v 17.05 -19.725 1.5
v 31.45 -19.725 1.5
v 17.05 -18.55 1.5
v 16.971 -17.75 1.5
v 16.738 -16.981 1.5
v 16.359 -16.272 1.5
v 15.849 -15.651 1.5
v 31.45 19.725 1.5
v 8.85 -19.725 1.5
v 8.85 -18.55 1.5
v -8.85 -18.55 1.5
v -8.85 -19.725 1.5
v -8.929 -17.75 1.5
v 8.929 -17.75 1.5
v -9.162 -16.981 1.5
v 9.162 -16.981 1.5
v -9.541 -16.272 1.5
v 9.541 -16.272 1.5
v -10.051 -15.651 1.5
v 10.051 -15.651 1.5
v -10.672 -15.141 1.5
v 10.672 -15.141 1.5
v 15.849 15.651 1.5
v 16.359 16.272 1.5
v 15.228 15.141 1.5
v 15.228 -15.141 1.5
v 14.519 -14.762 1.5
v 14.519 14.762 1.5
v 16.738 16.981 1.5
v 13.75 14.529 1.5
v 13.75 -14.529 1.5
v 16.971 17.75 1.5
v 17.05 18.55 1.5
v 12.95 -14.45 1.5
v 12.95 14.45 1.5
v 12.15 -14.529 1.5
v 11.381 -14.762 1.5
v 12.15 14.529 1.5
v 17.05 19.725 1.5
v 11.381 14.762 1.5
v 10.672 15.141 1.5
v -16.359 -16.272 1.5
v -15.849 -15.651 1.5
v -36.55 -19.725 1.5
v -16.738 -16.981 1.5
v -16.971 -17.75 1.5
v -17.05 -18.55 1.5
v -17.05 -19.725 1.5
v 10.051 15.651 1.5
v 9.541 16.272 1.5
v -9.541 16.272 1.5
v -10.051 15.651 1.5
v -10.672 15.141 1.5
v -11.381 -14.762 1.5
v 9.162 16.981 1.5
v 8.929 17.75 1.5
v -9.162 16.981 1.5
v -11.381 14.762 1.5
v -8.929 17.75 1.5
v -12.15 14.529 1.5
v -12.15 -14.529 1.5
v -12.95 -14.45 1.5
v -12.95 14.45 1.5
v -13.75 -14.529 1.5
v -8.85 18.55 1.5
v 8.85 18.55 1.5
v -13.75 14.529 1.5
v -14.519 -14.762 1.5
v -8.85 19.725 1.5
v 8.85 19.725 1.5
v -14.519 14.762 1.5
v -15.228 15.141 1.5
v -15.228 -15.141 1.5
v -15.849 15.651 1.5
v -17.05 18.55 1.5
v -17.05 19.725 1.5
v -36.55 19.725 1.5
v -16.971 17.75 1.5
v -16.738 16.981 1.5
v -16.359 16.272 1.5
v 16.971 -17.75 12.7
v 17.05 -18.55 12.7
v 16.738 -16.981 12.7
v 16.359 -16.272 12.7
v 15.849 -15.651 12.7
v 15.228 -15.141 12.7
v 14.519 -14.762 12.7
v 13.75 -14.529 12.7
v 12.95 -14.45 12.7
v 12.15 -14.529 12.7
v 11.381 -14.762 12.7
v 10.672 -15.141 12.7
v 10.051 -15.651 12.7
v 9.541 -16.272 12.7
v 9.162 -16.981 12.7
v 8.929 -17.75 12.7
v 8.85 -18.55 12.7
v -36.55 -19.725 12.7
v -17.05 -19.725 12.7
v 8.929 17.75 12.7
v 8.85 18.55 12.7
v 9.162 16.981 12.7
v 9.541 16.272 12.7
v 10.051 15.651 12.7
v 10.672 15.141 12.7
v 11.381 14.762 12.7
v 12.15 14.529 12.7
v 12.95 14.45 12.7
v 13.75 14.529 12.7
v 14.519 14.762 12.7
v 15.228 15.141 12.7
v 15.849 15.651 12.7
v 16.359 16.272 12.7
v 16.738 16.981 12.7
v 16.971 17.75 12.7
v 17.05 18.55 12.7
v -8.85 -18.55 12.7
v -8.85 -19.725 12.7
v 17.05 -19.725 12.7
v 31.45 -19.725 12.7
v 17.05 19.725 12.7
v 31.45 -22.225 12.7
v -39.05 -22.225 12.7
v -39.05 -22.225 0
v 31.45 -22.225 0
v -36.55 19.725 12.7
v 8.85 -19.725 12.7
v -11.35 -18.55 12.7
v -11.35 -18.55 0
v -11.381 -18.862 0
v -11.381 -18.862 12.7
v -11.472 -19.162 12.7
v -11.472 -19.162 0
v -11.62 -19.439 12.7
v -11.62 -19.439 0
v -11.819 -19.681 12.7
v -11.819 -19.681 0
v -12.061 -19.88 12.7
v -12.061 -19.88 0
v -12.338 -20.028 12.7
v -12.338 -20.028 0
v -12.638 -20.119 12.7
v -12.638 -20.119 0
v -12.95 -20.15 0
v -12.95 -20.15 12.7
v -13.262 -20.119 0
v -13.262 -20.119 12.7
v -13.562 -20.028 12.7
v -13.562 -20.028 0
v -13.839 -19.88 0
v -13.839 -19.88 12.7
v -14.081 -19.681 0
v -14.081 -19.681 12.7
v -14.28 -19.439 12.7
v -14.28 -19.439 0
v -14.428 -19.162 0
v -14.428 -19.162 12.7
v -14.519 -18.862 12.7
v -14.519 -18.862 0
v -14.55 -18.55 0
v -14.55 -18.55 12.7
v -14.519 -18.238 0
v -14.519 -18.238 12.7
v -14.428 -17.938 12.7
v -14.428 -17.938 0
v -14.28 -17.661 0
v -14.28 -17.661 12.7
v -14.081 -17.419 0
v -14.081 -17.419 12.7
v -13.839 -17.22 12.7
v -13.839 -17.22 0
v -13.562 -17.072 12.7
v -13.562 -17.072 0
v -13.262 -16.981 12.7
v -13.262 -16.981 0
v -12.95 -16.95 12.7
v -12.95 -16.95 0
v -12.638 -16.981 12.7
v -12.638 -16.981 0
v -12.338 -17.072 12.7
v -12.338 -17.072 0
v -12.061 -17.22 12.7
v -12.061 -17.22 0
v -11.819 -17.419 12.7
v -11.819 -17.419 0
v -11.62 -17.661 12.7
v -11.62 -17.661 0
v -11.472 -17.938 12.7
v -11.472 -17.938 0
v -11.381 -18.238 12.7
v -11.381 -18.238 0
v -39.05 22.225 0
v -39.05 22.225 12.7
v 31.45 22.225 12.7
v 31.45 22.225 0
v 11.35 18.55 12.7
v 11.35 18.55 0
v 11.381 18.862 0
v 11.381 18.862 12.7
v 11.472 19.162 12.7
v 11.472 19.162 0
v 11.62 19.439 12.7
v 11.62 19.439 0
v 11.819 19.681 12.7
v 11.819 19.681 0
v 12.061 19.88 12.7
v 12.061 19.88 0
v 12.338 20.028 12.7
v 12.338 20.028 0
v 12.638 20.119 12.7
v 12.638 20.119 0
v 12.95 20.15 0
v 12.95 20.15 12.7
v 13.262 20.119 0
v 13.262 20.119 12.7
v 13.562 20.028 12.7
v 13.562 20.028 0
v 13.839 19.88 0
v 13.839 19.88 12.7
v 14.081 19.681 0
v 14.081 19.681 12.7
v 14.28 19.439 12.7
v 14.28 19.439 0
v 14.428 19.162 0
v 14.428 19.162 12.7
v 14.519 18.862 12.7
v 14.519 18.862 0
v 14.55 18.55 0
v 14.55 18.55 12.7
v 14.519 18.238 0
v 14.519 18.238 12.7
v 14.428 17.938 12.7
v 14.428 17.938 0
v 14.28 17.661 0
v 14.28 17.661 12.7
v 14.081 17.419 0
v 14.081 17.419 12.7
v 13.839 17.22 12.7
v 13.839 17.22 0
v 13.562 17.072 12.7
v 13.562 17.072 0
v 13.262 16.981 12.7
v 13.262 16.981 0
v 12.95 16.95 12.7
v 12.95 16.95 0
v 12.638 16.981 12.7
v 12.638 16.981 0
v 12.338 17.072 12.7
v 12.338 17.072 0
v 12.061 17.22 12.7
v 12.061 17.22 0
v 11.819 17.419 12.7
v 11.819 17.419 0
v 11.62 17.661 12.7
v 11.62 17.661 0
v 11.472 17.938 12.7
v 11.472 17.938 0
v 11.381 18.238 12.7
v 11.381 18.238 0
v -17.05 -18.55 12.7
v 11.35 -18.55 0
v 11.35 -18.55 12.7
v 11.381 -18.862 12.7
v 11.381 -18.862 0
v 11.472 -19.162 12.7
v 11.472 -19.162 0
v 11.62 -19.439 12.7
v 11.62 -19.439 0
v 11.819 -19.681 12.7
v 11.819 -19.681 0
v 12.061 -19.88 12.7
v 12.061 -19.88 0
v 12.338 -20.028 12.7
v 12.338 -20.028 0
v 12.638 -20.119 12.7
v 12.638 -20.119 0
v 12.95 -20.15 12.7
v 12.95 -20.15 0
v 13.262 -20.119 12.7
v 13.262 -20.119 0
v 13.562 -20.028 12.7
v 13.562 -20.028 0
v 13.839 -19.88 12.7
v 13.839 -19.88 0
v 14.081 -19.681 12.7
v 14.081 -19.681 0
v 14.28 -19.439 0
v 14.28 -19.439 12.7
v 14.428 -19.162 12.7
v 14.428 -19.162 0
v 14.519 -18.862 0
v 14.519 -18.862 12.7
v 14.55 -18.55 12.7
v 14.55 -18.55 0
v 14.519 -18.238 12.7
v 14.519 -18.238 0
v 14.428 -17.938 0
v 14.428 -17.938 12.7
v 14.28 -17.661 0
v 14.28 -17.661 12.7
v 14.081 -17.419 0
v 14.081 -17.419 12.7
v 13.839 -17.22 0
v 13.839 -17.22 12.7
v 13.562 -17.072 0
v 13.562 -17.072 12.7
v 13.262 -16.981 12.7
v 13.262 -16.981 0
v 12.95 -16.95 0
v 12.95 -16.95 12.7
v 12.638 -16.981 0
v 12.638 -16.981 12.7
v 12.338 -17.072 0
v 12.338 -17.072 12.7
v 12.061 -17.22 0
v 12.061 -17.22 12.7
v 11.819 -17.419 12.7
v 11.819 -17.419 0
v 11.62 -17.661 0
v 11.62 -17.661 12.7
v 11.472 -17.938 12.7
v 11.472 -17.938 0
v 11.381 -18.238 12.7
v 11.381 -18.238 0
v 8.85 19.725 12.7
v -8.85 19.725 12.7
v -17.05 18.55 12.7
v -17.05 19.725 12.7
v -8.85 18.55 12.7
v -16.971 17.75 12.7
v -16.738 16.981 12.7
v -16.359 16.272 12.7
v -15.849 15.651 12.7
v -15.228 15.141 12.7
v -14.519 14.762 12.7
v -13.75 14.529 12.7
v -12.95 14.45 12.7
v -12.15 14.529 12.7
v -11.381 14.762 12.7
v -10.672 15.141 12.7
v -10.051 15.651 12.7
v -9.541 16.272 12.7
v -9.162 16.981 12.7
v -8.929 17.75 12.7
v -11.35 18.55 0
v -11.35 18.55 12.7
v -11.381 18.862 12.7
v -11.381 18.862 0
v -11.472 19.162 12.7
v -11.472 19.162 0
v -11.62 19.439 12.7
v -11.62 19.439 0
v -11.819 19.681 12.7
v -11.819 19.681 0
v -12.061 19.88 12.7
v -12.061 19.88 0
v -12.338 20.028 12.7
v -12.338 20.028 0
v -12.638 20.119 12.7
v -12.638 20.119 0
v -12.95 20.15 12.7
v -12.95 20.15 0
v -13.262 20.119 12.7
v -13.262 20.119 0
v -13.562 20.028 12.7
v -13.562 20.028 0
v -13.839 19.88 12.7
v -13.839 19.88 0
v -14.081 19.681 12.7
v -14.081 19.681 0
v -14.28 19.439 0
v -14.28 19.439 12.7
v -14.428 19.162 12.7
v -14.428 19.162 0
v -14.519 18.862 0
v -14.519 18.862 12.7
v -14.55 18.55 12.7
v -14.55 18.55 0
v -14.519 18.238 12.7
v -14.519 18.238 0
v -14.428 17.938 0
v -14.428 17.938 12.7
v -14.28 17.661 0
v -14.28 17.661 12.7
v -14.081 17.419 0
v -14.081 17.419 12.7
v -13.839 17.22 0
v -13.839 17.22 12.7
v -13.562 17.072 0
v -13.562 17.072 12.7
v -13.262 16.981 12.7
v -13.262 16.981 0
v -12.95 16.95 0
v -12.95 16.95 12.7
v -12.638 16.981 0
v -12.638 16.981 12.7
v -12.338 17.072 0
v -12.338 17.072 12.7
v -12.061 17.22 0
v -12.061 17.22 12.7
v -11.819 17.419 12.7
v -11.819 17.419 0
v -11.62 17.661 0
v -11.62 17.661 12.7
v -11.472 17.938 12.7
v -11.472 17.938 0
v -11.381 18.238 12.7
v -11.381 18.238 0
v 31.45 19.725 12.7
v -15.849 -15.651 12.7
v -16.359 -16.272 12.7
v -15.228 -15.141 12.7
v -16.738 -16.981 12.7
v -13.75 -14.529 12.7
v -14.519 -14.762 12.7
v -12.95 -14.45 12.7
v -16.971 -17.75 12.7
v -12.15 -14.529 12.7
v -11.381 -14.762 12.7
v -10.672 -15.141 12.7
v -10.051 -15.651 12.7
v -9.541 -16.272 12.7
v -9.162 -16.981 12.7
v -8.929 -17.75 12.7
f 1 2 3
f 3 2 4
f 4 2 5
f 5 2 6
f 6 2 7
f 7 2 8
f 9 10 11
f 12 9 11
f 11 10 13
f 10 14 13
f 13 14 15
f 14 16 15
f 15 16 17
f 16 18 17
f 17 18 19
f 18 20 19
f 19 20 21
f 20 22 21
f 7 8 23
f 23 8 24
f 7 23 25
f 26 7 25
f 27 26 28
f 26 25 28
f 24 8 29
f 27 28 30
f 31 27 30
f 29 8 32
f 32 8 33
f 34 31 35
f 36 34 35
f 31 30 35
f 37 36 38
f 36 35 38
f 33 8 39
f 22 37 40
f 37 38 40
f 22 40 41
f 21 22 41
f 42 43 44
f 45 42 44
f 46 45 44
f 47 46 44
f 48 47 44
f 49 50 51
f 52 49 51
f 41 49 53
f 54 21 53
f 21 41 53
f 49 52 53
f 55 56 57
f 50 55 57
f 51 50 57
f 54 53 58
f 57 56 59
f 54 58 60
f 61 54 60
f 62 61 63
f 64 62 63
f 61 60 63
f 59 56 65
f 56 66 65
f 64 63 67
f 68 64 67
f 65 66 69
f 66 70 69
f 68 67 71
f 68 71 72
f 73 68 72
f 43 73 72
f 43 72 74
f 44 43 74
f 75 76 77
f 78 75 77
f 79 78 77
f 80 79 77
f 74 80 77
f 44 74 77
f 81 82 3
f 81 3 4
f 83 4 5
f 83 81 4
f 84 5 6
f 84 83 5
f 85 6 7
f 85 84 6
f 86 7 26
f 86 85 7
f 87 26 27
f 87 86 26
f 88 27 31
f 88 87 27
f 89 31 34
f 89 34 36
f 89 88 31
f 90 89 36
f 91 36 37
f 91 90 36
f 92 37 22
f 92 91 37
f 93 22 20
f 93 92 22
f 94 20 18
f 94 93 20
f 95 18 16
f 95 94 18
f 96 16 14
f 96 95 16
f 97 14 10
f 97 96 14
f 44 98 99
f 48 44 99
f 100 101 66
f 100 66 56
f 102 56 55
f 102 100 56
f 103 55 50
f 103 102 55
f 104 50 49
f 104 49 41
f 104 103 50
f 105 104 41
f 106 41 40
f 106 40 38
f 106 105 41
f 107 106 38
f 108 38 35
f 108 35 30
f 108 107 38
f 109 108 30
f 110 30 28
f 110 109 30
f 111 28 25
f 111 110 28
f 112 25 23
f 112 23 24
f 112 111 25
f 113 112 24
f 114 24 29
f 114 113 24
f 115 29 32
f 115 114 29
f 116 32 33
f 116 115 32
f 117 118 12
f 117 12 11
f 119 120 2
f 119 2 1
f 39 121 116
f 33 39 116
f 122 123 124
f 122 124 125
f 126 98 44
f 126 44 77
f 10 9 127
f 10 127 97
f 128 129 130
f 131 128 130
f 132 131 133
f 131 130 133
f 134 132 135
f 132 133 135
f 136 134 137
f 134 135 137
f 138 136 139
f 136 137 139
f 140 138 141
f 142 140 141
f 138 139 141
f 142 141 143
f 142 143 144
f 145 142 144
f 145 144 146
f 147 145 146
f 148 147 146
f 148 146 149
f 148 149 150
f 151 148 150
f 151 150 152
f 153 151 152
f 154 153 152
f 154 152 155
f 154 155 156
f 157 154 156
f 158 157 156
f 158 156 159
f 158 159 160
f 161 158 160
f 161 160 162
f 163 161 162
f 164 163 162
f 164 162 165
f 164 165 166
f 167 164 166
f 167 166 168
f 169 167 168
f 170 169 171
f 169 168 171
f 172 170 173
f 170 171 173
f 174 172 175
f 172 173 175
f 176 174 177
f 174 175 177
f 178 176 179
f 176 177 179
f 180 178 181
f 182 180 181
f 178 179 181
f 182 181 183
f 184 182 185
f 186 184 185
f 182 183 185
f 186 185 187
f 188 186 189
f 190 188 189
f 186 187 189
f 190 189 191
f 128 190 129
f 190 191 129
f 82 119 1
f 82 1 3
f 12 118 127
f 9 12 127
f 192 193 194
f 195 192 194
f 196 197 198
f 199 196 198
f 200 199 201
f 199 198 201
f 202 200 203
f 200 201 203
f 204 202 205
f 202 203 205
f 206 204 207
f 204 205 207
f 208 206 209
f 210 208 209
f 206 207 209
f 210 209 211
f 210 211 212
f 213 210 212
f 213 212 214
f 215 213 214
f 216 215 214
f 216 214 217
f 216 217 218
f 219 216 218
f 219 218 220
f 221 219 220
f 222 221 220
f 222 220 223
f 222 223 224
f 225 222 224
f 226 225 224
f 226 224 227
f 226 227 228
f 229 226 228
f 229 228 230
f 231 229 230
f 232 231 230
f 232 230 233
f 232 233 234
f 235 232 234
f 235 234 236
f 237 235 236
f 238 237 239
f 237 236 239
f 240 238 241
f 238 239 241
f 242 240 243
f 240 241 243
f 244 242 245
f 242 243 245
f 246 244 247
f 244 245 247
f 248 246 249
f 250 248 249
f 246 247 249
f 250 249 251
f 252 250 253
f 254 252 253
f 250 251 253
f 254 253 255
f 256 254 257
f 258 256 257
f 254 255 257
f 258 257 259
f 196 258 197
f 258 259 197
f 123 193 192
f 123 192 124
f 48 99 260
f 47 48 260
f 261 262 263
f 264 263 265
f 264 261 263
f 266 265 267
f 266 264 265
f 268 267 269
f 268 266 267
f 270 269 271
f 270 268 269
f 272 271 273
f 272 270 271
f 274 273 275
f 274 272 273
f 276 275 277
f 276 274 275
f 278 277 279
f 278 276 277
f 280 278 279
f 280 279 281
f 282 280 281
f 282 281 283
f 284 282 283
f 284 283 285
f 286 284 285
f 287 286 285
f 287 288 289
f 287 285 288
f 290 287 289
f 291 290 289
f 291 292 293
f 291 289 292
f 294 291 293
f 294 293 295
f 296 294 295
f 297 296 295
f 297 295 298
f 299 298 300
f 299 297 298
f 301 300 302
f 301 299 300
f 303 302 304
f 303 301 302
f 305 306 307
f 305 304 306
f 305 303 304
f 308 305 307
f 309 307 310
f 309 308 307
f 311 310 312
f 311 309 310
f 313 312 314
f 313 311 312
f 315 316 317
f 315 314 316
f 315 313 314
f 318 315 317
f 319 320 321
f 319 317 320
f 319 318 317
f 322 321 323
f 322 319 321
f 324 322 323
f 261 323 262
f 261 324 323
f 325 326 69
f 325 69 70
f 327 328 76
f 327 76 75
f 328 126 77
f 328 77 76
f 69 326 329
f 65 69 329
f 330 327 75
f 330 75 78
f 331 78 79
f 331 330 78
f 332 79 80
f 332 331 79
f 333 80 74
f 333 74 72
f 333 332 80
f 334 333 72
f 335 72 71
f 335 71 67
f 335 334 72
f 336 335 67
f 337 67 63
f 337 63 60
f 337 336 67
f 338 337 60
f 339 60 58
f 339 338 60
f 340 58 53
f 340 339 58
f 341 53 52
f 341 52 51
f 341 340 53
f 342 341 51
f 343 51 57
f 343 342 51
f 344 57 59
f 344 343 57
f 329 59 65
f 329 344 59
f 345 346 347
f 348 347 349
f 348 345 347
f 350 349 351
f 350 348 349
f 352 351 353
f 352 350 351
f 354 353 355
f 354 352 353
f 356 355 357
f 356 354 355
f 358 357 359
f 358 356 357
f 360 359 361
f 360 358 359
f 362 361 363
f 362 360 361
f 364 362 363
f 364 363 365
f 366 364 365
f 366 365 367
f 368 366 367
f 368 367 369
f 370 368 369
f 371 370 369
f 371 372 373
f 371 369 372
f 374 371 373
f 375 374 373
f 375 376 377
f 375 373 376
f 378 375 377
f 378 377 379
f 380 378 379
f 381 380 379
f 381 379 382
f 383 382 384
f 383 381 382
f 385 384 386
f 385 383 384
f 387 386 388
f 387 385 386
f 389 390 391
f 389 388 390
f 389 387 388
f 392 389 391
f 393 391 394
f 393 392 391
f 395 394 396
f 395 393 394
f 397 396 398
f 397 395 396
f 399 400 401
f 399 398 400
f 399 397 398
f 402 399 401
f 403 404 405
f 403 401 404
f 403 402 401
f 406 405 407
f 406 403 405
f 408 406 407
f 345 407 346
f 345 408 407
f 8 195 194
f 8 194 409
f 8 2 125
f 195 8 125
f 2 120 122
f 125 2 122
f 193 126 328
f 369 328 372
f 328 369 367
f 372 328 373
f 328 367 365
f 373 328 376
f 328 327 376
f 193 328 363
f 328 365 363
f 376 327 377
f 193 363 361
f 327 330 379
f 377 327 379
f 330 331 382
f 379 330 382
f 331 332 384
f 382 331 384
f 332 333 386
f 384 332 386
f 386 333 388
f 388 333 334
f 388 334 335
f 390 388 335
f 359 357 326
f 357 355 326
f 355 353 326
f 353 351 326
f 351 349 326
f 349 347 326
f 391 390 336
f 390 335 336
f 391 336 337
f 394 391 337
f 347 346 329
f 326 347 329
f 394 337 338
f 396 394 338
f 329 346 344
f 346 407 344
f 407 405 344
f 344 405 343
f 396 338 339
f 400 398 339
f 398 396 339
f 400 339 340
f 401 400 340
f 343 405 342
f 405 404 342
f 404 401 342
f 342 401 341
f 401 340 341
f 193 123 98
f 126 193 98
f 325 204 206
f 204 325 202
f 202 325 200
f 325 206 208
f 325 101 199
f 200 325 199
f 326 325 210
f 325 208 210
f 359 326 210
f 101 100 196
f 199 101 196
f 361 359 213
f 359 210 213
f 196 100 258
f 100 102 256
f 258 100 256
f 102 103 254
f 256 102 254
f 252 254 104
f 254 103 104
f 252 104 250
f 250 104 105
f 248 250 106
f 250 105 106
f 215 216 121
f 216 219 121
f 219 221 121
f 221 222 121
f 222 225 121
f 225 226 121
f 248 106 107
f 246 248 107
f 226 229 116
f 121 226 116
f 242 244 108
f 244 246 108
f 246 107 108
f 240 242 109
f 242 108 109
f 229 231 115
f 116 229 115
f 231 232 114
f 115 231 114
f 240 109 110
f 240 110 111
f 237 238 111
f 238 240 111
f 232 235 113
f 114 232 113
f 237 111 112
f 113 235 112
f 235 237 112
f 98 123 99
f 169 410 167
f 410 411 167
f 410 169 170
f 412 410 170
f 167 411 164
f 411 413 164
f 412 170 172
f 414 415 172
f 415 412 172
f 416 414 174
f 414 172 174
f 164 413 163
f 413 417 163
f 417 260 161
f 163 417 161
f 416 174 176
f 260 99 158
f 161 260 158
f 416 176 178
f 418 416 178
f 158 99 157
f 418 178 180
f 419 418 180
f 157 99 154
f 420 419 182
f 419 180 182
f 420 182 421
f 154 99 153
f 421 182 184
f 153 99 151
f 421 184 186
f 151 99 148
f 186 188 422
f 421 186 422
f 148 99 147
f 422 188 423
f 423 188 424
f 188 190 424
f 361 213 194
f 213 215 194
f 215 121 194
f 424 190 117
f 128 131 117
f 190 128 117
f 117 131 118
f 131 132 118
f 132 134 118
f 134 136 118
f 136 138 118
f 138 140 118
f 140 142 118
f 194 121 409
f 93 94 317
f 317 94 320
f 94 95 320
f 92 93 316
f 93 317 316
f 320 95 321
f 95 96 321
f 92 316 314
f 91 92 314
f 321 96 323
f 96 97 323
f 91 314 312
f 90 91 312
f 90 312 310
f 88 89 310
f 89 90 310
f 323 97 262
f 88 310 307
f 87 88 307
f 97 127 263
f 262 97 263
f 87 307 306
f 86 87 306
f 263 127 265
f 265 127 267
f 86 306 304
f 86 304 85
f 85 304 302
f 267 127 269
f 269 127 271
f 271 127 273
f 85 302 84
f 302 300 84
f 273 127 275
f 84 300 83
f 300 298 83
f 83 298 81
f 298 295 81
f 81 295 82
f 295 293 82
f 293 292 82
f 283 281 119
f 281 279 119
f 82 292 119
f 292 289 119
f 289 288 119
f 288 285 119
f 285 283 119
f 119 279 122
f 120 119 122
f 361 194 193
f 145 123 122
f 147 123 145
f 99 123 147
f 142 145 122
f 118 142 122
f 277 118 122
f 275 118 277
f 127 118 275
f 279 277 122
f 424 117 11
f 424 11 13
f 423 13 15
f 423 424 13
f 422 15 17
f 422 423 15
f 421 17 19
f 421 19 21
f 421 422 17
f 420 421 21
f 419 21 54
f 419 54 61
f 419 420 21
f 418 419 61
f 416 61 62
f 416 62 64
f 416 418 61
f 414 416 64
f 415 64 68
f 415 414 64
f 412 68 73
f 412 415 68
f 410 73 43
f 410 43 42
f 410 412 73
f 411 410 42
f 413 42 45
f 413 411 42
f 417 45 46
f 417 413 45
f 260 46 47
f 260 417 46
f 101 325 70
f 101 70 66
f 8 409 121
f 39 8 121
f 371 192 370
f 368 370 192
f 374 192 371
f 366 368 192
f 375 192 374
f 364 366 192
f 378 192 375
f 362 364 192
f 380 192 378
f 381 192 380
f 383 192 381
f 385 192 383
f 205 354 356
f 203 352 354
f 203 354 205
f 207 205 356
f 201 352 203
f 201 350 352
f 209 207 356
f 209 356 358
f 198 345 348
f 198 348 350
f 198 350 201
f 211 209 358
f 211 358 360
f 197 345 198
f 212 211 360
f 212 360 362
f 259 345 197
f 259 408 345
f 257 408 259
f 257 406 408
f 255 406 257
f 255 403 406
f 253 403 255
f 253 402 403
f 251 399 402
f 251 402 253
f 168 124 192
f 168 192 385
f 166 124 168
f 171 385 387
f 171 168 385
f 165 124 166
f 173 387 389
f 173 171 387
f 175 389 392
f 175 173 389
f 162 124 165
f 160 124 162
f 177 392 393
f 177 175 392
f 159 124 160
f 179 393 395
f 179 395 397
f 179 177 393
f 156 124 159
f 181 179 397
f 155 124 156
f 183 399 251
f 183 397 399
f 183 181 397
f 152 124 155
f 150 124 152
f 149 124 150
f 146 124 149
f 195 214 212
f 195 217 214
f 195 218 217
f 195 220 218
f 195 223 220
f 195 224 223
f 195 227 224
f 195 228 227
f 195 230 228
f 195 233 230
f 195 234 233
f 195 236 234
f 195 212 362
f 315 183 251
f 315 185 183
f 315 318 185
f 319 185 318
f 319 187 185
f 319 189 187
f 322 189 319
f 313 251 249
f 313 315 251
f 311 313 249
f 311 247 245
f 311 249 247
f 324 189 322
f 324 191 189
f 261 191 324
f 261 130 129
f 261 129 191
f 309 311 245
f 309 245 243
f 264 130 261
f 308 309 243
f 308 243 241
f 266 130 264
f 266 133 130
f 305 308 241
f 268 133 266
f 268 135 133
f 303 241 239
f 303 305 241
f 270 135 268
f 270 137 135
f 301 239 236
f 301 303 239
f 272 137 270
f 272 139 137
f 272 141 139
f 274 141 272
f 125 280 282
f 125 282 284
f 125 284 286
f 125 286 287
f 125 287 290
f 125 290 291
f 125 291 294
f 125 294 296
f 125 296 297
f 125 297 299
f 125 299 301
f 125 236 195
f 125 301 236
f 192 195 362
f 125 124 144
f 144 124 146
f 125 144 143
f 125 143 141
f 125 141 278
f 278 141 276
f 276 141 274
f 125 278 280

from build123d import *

# Parameters (mm, degrees)
SKETCH_W                 = 70.5
SKETCH_H                 = 44.45
PAD_DEPTH                = 12.7
SKETCH001_R              = 1.6
POCKET_DEPTH             = 181.311112
SKETCH001_MIRRORED_2_R   = 1.6
POCKET_MIRRORED_2_DEPTH  = 181.311112
POCKET001_DEPTH          = 11.2
CLONE001_PLACEMENT_ANGLE = 180


with BuildPart() as part:
    # Sketch → Pad (new body)
    with BuildSketch(Plane.XY):
        with Locations((-3.8, 0)):
            Rectangle(SKETCH_W, SKETCH_H)
    extrude(amount=PAD_DEPTH)

    # Sketch001 (on Face6 of Pad) → Pocket (cut, through all)
    with BuildSketch(Plane.XY.offset(12.7)):
        with Locations((-12.95, 18.55)):
            Circle(SKETCH001_R)
    pocket = extrude(amount=-POCKET_DEPTH, mode=Mode.SUBTRACT)

    # Sketch001 Mirrored 2 → Pocket Mirrored 2 (cut, through all)
    with BuildSketch(Plane(origin=(0, 0, 12.7), x_dir=(-1, 0, 0), z_dir=(0, 0, -1))):
        with Locations((-12.95, 18.55)):
            Circle(SKETCH001_MIRRORED_2_R)
    pocket_mirrored_2 = extrude(amount=POCKET_MIRRORED_2_DEPTH, mode=Mode.SUBTRACT)

    # Mirrored001: Pocket, Pocket Mirrored 2 across XZ
    add(pocket.mirror(Plane.XZ), mode=Mode.SUBTRACT)
    add(pocket_mirrored_2.mirror(Plane.XZ), mode=Mode.SUBTRACT)

    # Sketch002 (on Face4 of MultiTransform) → Pocket001 (cut)
    with BuildSketch(Plane(origin=(0, 0, 0), x_dir=(1, 0, 0), z_dir=(0, 0, -1))):
        with BuildLine():
            Line((-36.55, -19.725), (-36.55, 19.725))
            Line((-36.55, 19.725), (-17.05, 19.725))
            Line((-17.05, 19.725), (-17.05, 18.55))
            ThreePointArc((-17.05, 18.55), (-12.95, 14.45), (-8.85, 18.55))
            Line((-8.85, 19.725), (-8.85, 18.55))
            Line((-8.85, 19.725), (8.85, 19.725))
            Line((8.85, 19.725), (8.85, 18.55))
            ThreePointArc((8.85, 18.55), (12.95, 14.45), (17.05, 18.55))
            Line((17.05, 19.725), (17.05, 18.55))
            Line((31.45, 19.725), (17.05, 19.725))
            Line((31.45, 19.725), (31.45, -19.725))
            Line((31.45, -19.725), (17.05, -19.725))
            Line((17.05, -19.725), (17.05, -18.549981))
            ThreePointArc((17.05, -18.549981), (12.949999, -14.45), (8.85, -18.549983))
            Line((8.85, -19.725), (8.85, -18.549983))
            Line((-8.85, -19.725), (8.85, -19.725))
            Line((-8.85, -19.725), (-8.85, -18.55))
            ThreePointArc((-8.85, -18.55), (-12.95, -14.45), (-17.05, -18.55))
            Line((-17.05, -19.725), (-17.05, -18.55))
            Line((-36.55, -19.725), (-17.05, -19.725))
        make_face()
    extrude(amount=-POCKET001_DEPTH, mode=Mode.SUBTRACT)


with BuildPart() as part_1:
    # Clone001 placement: moved
    add(part.part.moved(Location((0, 0, 12.7))).rotate(Axis((0, 0, 12.7), (1, 0, 0)), CLONE001_PLACEMENT_ANGLE))


solid = part_1.part
